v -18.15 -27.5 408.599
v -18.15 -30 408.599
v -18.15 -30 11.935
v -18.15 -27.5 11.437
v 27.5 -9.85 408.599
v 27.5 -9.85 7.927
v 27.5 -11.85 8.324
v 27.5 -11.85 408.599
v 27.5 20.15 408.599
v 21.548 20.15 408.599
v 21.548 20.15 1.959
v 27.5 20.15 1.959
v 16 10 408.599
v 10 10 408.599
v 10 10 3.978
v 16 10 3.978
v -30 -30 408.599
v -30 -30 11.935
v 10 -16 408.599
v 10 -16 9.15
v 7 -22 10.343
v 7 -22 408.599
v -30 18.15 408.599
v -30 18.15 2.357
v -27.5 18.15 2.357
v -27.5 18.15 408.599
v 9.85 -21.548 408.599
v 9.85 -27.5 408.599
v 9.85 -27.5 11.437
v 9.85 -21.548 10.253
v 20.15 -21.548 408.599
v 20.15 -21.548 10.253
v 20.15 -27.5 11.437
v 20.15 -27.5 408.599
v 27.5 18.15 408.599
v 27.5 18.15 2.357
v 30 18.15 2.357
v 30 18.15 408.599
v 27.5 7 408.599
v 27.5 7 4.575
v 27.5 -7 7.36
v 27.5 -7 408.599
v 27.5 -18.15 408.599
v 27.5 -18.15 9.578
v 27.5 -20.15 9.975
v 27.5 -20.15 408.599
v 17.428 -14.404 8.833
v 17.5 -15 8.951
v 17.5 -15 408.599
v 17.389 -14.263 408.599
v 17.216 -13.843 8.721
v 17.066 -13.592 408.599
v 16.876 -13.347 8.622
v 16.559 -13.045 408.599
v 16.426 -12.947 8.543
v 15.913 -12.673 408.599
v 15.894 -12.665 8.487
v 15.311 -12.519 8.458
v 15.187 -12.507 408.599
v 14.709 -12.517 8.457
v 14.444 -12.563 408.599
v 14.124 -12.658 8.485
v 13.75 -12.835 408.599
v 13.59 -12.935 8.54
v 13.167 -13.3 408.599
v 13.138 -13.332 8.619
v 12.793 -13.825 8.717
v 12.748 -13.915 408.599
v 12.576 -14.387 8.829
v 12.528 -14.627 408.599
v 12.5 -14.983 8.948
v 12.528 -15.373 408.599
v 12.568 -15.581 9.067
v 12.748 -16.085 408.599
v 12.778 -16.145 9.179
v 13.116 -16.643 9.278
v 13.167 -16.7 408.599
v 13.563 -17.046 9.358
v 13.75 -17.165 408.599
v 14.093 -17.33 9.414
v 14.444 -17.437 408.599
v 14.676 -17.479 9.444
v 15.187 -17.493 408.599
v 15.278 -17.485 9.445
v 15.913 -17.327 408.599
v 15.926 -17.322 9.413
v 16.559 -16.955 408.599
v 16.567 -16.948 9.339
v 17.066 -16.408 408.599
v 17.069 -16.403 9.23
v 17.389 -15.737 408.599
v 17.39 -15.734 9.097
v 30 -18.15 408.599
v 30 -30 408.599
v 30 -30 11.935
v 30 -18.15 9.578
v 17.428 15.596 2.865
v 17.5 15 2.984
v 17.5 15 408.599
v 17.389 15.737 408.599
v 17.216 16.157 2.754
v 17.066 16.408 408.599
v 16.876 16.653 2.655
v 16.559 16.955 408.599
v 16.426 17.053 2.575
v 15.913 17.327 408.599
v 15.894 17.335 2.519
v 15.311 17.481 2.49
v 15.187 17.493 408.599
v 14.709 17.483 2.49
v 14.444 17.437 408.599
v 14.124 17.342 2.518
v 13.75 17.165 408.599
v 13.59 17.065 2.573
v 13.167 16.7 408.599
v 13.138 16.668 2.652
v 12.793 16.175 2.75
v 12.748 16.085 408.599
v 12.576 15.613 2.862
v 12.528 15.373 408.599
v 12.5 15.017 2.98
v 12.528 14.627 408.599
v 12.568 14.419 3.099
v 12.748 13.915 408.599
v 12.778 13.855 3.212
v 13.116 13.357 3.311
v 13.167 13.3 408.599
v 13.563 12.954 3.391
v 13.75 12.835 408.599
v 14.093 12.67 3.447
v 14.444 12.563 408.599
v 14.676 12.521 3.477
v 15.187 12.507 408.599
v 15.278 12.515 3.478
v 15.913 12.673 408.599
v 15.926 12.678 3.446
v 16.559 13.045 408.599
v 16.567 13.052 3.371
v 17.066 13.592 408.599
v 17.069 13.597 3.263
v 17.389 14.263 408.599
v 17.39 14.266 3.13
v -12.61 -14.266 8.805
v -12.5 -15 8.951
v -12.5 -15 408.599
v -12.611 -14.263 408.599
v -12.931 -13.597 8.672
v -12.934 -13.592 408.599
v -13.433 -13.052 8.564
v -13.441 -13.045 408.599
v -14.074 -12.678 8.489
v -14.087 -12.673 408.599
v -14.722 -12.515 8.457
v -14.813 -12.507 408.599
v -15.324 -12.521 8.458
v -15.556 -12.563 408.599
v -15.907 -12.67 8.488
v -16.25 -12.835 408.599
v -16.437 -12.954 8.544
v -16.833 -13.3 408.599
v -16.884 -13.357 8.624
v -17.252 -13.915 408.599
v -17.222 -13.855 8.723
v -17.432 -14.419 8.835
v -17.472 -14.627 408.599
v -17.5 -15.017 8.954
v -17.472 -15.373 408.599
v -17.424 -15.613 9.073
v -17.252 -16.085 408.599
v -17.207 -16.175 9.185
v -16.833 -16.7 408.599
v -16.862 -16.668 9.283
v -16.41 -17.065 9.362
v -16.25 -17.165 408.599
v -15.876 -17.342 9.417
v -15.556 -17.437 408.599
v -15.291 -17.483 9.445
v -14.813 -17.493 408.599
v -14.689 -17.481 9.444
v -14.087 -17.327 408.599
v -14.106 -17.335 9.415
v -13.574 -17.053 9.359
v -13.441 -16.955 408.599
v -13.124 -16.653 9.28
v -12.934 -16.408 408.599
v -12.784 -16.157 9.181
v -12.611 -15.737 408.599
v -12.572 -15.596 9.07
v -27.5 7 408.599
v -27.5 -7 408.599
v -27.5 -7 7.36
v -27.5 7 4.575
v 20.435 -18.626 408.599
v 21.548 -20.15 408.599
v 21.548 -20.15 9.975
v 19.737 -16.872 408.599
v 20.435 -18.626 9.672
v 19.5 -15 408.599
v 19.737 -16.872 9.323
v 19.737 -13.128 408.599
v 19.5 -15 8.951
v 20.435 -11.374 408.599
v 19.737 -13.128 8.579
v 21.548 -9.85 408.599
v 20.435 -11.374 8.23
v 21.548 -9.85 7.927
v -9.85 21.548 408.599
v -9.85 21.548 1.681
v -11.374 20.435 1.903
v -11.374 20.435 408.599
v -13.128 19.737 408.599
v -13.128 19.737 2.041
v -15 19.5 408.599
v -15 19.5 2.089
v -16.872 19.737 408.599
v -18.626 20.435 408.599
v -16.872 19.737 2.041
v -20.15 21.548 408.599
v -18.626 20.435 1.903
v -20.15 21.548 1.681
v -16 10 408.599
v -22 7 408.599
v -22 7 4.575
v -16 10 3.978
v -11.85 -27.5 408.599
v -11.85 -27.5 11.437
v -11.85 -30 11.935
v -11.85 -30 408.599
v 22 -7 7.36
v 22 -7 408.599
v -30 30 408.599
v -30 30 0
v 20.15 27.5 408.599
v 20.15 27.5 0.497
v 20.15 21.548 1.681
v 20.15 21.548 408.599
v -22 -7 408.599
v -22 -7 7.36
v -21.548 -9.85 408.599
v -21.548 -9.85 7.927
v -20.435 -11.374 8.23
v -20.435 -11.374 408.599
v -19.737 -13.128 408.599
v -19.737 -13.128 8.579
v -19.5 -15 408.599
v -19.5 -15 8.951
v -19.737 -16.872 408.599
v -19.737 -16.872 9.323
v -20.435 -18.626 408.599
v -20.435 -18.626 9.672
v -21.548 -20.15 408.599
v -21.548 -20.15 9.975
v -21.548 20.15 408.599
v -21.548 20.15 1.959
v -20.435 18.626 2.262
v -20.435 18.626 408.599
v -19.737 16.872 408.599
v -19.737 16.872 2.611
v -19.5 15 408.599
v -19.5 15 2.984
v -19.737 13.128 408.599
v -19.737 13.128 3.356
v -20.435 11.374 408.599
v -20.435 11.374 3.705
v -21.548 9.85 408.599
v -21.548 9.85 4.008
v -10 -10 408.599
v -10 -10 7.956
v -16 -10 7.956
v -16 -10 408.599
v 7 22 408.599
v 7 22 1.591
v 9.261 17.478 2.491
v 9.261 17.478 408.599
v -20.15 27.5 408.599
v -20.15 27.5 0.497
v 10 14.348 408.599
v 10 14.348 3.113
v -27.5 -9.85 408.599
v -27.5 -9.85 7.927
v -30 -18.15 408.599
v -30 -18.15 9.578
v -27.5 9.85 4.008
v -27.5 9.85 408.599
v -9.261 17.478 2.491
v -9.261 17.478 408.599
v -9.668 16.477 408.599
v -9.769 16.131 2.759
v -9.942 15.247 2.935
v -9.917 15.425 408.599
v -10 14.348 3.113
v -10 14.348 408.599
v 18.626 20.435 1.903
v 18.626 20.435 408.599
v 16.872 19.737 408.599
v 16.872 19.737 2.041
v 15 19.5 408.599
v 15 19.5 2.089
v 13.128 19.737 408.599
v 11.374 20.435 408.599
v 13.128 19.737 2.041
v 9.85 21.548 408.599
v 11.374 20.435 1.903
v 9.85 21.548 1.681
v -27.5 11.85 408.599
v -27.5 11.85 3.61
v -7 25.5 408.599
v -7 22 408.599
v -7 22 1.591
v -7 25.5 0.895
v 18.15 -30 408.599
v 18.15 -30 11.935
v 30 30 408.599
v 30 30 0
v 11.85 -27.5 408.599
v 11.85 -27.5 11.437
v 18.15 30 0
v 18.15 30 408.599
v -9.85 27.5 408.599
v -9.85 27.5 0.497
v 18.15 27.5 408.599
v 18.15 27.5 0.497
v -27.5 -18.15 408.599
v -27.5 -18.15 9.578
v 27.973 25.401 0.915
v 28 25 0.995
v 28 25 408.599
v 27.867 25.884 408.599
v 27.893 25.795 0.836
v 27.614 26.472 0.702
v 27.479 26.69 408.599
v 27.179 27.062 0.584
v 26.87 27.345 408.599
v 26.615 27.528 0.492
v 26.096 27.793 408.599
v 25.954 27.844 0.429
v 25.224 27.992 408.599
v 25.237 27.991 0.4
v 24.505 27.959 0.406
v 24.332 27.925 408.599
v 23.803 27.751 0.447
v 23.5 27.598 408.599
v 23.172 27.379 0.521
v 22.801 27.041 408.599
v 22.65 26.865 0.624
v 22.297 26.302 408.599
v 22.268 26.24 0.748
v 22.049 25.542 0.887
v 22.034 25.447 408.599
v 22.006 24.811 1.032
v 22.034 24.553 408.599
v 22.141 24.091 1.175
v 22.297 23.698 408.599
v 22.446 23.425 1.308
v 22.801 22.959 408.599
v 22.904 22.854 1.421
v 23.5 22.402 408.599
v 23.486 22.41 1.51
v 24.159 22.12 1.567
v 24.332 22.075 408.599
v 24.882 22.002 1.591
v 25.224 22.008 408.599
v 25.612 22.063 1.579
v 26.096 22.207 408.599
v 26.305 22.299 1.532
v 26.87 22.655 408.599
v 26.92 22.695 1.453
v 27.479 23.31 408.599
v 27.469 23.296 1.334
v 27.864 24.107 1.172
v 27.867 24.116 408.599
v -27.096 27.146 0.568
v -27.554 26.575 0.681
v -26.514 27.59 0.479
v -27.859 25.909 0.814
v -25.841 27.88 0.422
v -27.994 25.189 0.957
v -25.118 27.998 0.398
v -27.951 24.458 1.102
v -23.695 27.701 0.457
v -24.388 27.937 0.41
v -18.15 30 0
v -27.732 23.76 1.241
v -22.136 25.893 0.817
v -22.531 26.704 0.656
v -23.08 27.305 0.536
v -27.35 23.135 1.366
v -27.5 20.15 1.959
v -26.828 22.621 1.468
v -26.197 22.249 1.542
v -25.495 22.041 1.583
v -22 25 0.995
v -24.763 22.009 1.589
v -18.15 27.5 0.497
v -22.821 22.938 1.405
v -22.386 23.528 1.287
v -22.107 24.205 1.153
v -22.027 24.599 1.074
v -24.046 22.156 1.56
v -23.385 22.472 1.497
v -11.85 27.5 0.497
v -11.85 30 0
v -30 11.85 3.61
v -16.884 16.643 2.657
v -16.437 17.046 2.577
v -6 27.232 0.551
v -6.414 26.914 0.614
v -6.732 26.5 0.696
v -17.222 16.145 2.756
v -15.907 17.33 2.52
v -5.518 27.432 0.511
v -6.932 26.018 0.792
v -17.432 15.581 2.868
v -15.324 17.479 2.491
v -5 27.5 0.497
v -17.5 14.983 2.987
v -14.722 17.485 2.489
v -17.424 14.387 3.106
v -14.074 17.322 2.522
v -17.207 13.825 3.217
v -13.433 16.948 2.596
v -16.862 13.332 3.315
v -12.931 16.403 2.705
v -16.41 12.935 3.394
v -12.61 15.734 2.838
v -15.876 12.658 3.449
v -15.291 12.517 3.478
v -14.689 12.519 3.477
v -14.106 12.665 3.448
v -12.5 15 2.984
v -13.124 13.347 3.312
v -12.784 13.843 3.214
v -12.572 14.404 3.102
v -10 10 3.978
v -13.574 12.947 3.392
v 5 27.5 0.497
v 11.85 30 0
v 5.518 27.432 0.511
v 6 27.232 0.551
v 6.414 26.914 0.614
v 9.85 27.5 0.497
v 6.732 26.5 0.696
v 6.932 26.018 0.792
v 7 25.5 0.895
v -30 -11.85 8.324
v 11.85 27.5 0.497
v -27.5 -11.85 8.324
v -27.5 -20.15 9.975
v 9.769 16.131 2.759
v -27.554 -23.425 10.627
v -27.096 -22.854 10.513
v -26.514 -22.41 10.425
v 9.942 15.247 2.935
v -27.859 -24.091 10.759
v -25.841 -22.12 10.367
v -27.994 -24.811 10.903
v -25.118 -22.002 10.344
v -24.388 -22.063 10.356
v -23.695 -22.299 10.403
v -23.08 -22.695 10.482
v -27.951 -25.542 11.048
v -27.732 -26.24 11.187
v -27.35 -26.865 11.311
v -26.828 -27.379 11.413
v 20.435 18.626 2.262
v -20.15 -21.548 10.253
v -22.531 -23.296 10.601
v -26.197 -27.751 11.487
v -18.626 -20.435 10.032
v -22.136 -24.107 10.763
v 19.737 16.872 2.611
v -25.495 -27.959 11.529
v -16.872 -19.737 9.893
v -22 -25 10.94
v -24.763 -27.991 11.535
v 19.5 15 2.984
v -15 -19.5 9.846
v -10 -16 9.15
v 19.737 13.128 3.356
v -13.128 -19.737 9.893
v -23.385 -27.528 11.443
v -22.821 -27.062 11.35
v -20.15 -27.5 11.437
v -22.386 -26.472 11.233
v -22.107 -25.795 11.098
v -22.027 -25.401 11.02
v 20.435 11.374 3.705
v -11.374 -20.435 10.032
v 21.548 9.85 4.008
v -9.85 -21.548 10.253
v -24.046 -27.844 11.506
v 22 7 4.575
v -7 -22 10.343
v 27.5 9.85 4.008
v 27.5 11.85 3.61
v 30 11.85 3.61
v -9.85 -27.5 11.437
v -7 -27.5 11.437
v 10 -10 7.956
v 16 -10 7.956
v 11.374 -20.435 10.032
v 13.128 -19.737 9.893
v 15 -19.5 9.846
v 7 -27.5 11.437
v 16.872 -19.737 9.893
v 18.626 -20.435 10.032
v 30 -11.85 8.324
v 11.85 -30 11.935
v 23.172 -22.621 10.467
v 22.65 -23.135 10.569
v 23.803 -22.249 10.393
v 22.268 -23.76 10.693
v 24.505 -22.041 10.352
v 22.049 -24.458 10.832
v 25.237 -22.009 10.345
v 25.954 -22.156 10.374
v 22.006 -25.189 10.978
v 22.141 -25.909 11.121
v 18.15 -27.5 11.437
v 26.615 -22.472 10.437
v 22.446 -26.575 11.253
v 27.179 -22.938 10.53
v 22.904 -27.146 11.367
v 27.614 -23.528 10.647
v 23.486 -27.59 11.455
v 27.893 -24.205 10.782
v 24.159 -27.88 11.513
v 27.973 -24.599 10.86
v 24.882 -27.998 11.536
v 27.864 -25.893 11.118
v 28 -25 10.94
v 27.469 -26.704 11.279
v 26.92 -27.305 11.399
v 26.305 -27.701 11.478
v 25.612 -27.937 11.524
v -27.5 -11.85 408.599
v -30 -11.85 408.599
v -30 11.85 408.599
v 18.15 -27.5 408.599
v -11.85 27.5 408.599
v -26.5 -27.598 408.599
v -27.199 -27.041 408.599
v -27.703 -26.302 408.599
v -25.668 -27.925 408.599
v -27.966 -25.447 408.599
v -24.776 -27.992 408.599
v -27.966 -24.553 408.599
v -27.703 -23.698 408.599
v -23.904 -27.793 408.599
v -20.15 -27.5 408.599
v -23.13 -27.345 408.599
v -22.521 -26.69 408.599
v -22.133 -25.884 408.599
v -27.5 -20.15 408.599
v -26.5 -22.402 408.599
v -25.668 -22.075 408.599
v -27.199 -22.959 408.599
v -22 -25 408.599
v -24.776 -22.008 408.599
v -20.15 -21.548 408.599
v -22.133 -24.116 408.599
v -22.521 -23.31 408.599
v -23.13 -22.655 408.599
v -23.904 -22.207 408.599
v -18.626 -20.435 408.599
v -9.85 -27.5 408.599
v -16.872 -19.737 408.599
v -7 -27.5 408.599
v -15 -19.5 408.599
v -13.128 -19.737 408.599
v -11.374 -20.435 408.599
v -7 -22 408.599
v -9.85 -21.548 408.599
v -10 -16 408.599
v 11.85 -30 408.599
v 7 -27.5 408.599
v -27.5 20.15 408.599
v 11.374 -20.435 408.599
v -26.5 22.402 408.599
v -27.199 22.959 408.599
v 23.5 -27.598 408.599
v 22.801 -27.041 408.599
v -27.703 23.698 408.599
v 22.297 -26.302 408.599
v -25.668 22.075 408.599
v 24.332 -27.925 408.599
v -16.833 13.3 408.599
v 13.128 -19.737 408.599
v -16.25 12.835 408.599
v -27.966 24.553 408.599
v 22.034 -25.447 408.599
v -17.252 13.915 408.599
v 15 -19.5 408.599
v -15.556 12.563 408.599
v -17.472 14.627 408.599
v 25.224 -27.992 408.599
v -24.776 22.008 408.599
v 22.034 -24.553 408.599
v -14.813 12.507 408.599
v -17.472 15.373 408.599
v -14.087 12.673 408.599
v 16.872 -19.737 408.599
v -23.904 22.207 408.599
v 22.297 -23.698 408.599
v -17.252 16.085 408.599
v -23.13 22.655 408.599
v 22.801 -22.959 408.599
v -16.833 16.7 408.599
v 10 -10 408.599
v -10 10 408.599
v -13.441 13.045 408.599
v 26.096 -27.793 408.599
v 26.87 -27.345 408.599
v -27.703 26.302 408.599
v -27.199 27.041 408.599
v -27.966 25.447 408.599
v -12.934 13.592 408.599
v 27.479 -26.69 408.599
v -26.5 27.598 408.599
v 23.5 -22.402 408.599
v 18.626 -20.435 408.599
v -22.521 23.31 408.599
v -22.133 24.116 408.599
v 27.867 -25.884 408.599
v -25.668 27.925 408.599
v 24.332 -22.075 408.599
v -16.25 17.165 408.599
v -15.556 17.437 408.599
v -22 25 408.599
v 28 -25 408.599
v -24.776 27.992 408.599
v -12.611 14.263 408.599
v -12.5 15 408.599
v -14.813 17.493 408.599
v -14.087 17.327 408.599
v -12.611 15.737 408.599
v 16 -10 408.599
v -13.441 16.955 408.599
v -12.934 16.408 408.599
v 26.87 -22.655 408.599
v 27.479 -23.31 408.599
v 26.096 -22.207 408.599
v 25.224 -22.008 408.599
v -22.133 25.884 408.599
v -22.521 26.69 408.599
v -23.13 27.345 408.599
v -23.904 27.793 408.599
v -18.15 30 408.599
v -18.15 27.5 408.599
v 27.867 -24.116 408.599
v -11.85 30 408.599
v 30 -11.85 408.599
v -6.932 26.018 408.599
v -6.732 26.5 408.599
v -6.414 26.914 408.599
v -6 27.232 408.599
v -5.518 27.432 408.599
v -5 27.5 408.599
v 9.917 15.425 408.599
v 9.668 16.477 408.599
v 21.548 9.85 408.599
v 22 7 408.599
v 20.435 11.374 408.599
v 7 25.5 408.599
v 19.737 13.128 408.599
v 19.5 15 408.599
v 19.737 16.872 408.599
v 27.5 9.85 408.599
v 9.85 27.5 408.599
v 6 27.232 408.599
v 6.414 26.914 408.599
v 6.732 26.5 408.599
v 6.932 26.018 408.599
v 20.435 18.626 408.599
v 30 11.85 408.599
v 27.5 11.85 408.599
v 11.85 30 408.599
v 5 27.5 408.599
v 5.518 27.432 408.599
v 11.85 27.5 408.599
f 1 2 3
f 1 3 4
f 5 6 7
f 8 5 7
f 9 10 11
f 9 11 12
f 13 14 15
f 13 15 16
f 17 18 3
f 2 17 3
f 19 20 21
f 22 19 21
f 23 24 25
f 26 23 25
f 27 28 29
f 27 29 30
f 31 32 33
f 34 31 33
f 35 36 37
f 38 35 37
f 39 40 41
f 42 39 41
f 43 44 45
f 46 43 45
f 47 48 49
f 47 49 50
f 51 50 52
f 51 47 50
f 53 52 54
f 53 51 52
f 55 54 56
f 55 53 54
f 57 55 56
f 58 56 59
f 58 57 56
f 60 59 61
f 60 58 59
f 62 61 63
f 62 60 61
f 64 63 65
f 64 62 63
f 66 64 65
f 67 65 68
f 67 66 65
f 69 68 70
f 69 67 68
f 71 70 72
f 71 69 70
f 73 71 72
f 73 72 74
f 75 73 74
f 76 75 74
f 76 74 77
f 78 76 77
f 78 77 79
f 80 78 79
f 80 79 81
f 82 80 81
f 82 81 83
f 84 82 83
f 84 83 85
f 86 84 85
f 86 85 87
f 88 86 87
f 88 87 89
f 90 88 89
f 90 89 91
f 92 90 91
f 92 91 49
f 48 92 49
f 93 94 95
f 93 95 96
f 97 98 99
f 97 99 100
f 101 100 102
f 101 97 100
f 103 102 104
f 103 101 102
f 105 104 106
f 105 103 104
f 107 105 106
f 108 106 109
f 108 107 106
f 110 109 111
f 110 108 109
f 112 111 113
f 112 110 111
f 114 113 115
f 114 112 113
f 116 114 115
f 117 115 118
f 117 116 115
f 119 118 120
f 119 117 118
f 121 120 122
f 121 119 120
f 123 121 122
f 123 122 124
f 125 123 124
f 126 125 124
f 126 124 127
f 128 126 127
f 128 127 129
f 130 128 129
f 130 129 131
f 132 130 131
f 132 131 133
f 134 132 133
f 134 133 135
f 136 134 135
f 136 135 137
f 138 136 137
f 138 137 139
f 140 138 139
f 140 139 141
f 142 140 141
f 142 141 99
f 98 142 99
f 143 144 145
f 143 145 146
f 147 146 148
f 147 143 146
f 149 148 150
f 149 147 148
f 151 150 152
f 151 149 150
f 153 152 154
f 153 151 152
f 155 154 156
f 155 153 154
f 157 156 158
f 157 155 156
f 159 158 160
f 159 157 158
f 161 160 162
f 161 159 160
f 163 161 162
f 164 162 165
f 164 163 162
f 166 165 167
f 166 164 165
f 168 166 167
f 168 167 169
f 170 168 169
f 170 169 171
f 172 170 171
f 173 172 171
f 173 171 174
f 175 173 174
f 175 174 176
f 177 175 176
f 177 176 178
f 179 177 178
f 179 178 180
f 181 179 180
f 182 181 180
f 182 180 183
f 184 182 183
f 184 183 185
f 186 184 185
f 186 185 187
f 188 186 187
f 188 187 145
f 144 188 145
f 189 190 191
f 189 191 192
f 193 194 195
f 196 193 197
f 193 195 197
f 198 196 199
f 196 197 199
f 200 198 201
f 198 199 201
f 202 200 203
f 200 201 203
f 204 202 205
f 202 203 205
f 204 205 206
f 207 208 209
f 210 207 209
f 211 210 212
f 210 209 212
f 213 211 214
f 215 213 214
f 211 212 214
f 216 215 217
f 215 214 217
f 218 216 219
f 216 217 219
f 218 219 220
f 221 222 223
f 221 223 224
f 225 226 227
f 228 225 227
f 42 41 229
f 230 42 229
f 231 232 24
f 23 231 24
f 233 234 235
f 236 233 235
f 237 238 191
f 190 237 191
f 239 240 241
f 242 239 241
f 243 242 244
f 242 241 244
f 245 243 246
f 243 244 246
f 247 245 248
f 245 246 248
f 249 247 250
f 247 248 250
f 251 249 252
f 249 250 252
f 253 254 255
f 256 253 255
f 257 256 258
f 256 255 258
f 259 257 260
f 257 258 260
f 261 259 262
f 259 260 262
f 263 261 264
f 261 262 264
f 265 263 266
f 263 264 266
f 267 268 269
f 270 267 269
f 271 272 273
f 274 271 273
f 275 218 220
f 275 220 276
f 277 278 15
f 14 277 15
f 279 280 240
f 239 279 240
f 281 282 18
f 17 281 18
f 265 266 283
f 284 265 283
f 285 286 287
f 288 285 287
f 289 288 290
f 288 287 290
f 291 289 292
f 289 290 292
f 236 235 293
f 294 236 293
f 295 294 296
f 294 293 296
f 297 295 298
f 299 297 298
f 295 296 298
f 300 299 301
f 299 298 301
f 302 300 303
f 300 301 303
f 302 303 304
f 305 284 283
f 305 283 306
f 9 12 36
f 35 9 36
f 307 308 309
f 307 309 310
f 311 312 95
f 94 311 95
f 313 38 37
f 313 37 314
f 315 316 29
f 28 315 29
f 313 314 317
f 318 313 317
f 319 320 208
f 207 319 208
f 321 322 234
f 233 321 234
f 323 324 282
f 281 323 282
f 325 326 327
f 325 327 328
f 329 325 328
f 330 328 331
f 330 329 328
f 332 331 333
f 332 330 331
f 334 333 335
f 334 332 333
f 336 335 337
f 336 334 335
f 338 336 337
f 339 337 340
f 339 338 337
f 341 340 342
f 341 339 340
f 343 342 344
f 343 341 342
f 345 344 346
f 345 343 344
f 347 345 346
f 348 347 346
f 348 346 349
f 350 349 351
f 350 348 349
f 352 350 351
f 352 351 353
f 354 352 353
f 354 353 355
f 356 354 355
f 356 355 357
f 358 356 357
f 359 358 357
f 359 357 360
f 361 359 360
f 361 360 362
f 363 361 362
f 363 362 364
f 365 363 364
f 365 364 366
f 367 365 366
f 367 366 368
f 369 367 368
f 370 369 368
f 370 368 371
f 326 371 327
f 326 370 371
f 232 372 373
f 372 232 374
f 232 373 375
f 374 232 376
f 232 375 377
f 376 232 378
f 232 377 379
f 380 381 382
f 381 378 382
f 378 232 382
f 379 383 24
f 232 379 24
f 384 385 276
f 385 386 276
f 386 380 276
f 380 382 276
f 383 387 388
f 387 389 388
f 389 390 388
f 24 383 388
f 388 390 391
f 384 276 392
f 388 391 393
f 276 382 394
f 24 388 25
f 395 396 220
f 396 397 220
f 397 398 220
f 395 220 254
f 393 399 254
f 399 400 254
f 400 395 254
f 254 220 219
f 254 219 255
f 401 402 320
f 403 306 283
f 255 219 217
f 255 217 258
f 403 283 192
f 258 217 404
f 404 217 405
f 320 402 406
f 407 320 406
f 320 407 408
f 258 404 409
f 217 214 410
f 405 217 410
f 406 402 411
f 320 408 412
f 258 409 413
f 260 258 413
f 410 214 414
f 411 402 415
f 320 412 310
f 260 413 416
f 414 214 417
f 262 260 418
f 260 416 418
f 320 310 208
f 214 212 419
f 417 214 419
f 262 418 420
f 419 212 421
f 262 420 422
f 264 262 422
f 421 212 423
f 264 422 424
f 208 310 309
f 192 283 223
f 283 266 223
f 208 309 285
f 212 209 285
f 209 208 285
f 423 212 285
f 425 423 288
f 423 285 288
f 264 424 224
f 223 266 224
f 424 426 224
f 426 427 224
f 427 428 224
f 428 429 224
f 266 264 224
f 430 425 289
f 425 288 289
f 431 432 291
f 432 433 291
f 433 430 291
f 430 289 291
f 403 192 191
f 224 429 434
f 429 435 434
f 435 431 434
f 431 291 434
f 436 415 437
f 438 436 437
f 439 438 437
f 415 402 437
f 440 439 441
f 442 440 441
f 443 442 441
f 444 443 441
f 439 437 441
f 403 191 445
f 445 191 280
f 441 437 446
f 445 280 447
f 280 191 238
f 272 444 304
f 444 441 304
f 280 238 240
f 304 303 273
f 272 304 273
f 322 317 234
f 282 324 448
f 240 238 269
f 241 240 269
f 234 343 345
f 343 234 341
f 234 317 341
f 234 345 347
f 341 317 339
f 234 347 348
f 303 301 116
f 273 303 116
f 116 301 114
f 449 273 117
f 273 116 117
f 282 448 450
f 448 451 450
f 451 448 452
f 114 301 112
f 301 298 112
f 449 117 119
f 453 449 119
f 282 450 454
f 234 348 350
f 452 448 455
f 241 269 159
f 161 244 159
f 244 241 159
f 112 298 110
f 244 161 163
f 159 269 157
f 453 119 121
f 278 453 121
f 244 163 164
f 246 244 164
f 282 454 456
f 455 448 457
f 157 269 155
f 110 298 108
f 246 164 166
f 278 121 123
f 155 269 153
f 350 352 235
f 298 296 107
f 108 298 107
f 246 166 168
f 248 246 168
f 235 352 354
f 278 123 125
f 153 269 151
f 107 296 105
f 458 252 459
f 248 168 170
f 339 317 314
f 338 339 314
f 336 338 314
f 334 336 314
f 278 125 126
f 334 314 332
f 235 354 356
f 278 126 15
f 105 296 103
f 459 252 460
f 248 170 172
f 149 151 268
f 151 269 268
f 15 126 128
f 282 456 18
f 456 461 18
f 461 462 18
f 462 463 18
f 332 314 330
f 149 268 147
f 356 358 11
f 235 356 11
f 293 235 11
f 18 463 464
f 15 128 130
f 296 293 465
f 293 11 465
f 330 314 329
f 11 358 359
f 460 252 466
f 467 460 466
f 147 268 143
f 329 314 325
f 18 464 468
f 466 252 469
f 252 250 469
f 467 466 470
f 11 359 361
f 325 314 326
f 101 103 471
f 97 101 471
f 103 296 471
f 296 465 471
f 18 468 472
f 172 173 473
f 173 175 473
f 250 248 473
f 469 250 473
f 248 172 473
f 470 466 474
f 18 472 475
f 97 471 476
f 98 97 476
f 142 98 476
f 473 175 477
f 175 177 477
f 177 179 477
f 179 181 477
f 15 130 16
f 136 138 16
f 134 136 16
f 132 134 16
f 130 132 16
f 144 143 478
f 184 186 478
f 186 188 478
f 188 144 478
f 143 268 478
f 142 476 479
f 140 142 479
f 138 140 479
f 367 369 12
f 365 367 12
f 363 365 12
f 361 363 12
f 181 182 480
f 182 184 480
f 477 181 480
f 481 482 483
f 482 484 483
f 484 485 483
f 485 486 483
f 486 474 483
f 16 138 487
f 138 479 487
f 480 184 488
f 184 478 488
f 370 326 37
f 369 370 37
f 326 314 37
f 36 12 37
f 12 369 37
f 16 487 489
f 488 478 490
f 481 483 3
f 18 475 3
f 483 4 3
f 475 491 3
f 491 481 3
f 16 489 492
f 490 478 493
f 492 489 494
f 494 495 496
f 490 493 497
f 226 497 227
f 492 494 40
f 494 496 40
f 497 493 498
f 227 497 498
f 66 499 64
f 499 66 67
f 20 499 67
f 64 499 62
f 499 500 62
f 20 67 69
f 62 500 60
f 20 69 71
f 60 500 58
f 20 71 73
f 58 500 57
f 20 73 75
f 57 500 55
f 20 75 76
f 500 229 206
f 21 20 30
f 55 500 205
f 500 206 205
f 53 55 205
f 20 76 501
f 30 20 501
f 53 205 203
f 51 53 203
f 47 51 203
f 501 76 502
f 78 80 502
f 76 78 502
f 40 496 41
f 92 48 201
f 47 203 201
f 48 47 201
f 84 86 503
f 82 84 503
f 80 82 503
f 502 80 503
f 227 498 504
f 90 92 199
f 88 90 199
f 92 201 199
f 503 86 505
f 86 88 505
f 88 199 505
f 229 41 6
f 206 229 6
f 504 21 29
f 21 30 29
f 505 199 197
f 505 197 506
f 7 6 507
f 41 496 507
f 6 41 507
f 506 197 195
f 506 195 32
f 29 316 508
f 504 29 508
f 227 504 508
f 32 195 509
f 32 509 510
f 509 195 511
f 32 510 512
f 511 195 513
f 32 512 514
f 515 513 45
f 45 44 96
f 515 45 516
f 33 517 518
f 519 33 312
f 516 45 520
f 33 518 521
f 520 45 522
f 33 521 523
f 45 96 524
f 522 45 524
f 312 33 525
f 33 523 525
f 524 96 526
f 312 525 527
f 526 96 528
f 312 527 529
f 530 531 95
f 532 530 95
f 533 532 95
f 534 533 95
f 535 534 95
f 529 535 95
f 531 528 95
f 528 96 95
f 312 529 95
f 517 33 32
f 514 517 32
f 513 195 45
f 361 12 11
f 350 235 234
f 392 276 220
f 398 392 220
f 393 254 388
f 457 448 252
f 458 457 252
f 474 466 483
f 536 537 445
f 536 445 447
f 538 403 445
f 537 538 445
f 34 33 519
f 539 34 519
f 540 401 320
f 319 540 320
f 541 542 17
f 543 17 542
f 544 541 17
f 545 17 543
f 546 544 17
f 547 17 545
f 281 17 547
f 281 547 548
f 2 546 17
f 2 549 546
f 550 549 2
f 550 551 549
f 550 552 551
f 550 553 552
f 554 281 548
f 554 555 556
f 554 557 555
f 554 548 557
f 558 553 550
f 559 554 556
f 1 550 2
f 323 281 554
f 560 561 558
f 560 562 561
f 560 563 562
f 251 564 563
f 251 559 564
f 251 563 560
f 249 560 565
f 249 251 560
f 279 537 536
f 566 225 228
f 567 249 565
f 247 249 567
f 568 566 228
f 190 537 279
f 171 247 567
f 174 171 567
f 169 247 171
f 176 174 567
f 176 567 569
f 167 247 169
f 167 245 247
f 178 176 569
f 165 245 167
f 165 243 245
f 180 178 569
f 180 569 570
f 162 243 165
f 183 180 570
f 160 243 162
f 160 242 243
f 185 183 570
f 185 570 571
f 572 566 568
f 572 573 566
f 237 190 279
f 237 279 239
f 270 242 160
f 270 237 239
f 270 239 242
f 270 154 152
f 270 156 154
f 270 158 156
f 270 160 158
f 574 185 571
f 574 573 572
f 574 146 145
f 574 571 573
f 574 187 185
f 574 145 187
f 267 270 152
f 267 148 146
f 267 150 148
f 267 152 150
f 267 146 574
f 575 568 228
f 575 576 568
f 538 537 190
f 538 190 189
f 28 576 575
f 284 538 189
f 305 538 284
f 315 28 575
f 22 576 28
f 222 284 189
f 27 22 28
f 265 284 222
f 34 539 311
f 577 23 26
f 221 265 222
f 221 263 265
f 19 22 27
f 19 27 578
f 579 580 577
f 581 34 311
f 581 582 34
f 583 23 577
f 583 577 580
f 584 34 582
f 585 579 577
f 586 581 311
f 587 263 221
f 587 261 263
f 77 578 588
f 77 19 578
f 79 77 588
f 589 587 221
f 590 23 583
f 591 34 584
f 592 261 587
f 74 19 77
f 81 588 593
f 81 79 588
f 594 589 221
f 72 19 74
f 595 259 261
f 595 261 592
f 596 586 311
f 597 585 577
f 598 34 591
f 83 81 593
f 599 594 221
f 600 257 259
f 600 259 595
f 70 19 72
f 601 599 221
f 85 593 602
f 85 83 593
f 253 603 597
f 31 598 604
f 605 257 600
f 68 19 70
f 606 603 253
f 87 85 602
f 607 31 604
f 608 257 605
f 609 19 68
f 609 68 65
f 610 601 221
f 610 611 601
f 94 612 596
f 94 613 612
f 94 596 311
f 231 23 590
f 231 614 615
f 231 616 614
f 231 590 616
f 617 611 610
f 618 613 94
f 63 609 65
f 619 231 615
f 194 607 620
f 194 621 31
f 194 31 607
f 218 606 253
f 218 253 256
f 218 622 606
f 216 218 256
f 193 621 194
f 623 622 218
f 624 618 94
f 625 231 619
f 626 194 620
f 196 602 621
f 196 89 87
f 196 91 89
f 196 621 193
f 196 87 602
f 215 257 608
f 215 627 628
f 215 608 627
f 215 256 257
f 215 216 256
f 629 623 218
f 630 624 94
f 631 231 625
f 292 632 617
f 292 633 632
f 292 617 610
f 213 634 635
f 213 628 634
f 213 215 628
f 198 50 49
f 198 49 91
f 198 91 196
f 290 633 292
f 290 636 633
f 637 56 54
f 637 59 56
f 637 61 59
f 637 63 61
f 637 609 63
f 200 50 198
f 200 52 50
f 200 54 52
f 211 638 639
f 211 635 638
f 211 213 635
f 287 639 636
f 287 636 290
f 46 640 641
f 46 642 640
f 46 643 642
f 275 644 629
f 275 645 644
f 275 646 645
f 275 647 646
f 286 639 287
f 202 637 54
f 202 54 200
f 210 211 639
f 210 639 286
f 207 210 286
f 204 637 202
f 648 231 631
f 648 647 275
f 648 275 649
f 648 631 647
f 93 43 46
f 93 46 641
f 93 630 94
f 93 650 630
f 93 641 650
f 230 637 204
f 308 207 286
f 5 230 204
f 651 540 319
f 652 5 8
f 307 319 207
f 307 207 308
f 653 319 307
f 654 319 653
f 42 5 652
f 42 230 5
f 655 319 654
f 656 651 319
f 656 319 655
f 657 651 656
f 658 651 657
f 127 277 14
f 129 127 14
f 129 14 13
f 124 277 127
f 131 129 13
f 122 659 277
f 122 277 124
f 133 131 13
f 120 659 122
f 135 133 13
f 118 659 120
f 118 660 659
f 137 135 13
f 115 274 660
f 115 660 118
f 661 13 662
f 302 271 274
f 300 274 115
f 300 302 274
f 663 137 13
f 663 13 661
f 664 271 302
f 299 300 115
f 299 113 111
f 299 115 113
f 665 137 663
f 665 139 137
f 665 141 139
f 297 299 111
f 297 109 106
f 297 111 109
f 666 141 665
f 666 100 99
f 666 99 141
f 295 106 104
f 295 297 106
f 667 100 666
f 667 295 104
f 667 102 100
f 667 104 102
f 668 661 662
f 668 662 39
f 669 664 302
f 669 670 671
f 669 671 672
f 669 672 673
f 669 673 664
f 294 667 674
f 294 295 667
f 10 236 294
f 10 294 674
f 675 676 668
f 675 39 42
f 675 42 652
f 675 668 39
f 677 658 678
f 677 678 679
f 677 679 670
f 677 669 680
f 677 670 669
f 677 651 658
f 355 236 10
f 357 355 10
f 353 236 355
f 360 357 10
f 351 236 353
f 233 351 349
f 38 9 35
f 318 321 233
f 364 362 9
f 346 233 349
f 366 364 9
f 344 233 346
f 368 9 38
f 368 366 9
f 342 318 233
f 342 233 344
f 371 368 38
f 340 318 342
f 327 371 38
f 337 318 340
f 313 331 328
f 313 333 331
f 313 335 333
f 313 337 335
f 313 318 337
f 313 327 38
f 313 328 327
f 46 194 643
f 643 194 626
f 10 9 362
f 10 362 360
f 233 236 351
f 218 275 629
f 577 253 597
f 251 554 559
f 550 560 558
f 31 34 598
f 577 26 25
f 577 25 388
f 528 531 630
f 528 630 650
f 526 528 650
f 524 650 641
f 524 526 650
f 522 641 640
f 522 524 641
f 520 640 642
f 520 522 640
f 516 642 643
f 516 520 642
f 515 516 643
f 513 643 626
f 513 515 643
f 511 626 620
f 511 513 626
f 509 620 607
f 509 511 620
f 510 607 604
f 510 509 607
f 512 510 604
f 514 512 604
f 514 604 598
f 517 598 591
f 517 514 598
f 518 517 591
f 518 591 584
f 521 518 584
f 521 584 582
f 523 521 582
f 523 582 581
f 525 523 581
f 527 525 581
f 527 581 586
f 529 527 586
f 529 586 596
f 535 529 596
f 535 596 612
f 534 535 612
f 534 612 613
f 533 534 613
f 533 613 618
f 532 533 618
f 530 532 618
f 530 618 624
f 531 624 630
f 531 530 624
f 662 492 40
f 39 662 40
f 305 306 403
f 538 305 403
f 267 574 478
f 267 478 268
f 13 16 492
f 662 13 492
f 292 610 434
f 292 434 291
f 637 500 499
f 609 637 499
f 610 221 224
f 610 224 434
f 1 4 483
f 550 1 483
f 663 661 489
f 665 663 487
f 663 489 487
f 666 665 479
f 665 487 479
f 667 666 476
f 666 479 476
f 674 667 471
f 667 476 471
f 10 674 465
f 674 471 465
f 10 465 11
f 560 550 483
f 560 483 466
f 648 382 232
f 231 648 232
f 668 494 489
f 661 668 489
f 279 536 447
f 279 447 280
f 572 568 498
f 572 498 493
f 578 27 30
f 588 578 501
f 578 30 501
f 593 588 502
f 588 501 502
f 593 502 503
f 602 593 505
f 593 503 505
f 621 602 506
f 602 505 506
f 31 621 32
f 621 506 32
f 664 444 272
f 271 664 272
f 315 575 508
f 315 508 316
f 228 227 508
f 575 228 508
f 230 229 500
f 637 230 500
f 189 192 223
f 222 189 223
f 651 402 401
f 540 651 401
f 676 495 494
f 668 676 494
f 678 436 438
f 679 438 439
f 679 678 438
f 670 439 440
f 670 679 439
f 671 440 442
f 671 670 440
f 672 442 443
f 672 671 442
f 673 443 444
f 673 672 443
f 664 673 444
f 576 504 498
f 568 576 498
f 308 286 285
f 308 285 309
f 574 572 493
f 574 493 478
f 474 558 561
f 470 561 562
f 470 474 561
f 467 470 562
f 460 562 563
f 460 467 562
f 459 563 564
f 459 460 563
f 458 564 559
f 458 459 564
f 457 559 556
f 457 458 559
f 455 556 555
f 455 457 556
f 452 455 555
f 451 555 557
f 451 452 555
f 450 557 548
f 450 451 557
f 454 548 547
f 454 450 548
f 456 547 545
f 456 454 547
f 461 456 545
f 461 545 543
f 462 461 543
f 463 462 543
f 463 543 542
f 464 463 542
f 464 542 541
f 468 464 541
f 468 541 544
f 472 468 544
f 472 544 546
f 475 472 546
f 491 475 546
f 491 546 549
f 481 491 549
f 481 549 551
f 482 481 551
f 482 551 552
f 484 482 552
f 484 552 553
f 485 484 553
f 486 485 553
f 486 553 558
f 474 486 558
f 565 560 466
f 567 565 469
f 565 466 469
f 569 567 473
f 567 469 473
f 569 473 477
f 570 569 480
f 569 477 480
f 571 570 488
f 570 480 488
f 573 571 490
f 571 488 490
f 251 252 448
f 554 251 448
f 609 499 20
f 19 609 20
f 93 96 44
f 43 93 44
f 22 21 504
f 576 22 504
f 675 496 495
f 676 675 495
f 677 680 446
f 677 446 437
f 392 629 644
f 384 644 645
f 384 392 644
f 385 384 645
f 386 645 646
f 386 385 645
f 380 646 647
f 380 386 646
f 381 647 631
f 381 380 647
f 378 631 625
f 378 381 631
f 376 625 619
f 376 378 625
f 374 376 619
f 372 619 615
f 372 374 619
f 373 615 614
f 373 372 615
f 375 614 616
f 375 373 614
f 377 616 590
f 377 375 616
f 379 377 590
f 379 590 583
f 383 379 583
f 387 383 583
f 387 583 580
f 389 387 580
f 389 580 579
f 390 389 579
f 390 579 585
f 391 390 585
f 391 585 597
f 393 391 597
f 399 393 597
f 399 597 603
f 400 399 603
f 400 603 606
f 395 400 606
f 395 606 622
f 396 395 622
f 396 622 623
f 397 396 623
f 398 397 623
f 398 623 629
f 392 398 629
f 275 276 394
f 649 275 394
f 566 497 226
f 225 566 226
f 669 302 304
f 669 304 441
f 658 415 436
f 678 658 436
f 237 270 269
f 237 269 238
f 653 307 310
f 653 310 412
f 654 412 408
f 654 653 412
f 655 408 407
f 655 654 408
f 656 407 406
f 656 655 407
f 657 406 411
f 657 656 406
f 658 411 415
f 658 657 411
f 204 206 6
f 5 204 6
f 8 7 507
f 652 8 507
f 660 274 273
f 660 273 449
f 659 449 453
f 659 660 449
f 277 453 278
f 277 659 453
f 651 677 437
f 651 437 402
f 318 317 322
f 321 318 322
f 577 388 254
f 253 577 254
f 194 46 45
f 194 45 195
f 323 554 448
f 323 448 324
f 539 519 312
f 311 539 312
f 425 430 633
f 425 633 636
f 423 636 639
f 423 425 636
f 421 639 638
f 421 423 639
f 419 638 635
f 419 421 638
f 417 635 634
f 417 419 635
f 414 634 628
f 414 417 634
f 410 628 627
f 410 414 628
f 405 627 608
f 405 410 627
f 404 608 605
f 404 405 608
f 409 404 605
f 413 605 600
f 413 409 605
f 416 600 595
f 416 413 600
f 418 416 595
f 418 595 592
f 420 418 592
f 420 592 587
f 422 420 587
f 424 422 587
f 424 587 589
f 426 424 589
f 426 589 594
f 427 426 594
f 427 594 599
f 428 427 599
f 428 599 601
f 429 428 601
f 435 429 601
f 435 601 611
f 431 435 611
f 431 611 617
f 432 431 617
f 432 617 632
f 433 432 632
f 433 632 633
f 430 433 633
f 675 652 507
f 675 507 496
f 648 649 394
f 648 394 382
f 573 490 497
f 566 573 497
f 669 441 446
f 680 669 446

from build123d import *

# Parameters (mm, degrees)
F0_R          = 3
F0_R_2        = 2.5
F1_DEPTH      = 408.599
F2_R          = 2
F3_R          = 7
F5_DEPTH      = 30
F5_DEPTH_BACK = 30


# Not quite as in the source:
# - a feature names something its author has since deleted; it is built from what else it names


with BuildPart() as f1:
    # F0 (on Top) → F1 (new body)
    with BuildSketch(Plane.XY):
        with BuildLine():
            Line((18.15, -30), (30, -30))
            Line((30, -30), (30, -18.15))
            Line((30, -18.15), (27.5, -18.15))
            Line((27.5, -18.15), (27.5, -20.15))
            Line((27.5, -20.15), (21.5477069044, -20.15))
            ThreePointArc((21.5477069044, -20.15), (19.5, -15), (21.5477069044, -9.85))
            Line((21.5477069044, -9.85), (27.5, -9.85))
            Line((27.5, -9.85), (27.5, -11.85))
            Line((27.5, -11.85), (30, -11.85))
            Line((30, -11.85), (30, 11.85))
            Line((30, 11.85), (27.5, 11.85))
            Line((27.5, 11.85), (27.5, 9.85))
            Line((27.5, 9.85), (21.5477069044, 9.85))
            ThreePointArc((21.5477069044, 9.85), (19.5, 15), (21.5477069044, 20.15))
            Line((21.5477069044, 20.15), (27.5, 20.15))
            Line((27.5, 20.15), (27.5, 18.15))
            Line((27.5, 18.15), (30, 18.15))
            Line((30, 18.15), (30, 30))
            Line((30, 30), (18.15, 30))
            Line((18.15, 30), (18.15, 27.5))
            Line((18.15, 27.5), (20.15, 27.5))
            Line((20.15, 27.5), (20.15, 21.5477069044))
            ThreePointArc((20.15, 21.5477069044), (15, 19.5), (9.85, 21.5477069044))
            Line((9.85, 21.5477069044), (9.85, 27.5))
            Line((9.85, 27.5), (11.85, 27.5))
            Line((11.85, 27.5), (11.85, 30))
            Line((11.85, 30), (-11.85, 30))
            Line((-11.85, 30), (-11.85, 27.5))
            Line((-11.85, 27.5), (-9.85, 27.5))
            Line((-9.85, 27.5), (-9.85, 21.5477069044))
            ThreePointArc((-9.85, 21.5477069044), (-15, 19.5), (-20.15, 21.5477069044))
            Line((-20.15, 21.5477069044), (-20.15, 27.5))
            Line((-20.15, 27.5), (-18.15, 27.5))
            Line((-18.15, 27.5), (-18.15, 30))
            Line((-18.15, 30), (-30, 30))
            Line((-30, 30), (-30, 18.15))
            Line((-30, 18.15), (-27.5, 18.15))
            Line((-27.5, 18.15), (-27.5, 20.15))
            Line((-27.5, 20.15), (-21.5477069044, 20.15))
            ThreePointArc((-21.5477069044, 20.15), (-19.5, 15), (-21.5477069044, 9.85))
            Line((-21.5477069044, 9.85), (-27.5, 9.85))
            Line((-27.5, 9.85), (-27.5, 11.85))
            Line((-27.5, 11.85), (-30, 11.85))
            Line((-30, 11.85), (-30, -11.85))
            Line((-30, -11.85), (-27.5, -11.85))
            Line((-27.5, -11.85), (-27.5, -9.85))
            Line((-27.5, -9.85), (-21.5477069044, -9.85))
            ThreePointArc((-21.5477069044, -9.85), (-19.5, -15), (-21.5477069044, -20.15))
            Line((-21.5477069044, -20.15), (-27.5, -20.15))
            Line((-27.5, -20.15), (-27.5, -18.15))
            Line((-27.5, -18.15), (-30, -18.15))
            Line((-30, -18.15), (-30, -30))
            Line((-30, -30), (-18.15, -30))
            Line((-18.15, -30), (-18.15, -27.5))
            Line((-18.15, -27.5), (-20.15, -27.5))
            Line((-20.15, -27.5), (-20.15, -21.5477069044))
            ThreePointArc((-20.15, -21.5477069044), (-15, -19.5), (-9.85, -21.5477069044))
            Line((-9.85, -21.5477069044), (-9.85, -27.5))
            Line((-9.85, -27.5), (-11.85, -27.5))
            Line((-11.85, -27.5), (-11.85, -30))
            Line((-11.85, -30), (11.85, -30))
            Line((11.85, -30), (11.85, -27.5))
            Line((11.85, -27.5), (9.85, -27.5))
            Line((9.85, -27.5), (9.85, -21.5477069044))
            ThreePointArc((9.85, -21.5477069044), (15, -19.5), (20.15, -21.5477069044))
            Line((20.15, -21.5477069044), (20.15, -27.5))
            Line((20.15, -27.5), (18.15, -27.5))
            Line((18.15, -27.5), (18.15, -30))
        make_face()
        with Locations((-25, -25)):
            Circle(F0_R, mode=Mode.SUBTRACT)
        with Locations((-15, -15)):
            Circle(F0_R_2, mode=Mode.SUBTRACT)
        with Locations((25, -25)):
            Circle(F0_R, mode=Mode.SUBTRACT)
        with Locations((15, -15)):
            Circle(F0_R_2, mode=Mode.SUBTRACT)
        with Locations((-25, 25)):
            Circle(F0_R, mode=Mode.SUBTRACT)
        with Locations((-15, 15)):
            Circle(F0_R_2, mode=Mode.SUBTRACT)
        Polygon((-7, 22), (-7, 27.5), (0, 27.5), (7, 27.5), (7, 22), (10, 16), (10, 10), (16, 10), (22, 7), (27.5, 7), (27.5, 0), (27.5, -7), (22, -7), (16, -10), (10, -10), (10, -16), (7, -22), (7, -27.5), (0, -27.5), (-7, -27.5), (-7, -22), (-10, -16), (-10, -10), (-16, -10), (-22, -7), (-27.5, -7), (-27.5, 0), (-27.5, 7), (-22, 7), (-16, 10), (-10, 10), (-10, 16), align=None, mode=Mode.SUBTRACT)
        with Locations((15, 15)):
            Circle(F0_R_2, mode=Mode.SUBTRACT)
        with Locations((25, 25)):
            Circle(F0_R, mode=Mode.SUBTRACT)
    extrude(amount=F1_DEPTH)

    # F2
    f2_edges = [f1.edges().sort_by_distance(p)[0] for p in [
        (-7, 27.5, 204.2995),
        (7, 27.5, 204.2995),
    ]]
    fillet(f2_edges, radius=F2_R)

    # F3
    f3_edges = [f1.edges().sort_by_distance(p)[0] for p in [
        (-10, 16, 204.2995),
        (10, 16, 204.2995),
    ]]
    fillet(f3_edges, radius=F3_R)

    # F4 (on Right) → F5 (cut, two sides)
    with BuildSketch(Plane.YZ) as f5_sk:
        Polygon((-164.2855995683, 38.6458085579), (-188.5911429791, -83.5464097089), (5.6944565892, -122.1922182668), (30, 0), align=None)
    extrude(amount=F5_DEPTH, mode=Mode.SUBTRACT)
    extrude(f5_sk.sketch, amount=-F5_DEPTH_BACK, mode=Mode.SUBTRACT)


solid = f1.part
